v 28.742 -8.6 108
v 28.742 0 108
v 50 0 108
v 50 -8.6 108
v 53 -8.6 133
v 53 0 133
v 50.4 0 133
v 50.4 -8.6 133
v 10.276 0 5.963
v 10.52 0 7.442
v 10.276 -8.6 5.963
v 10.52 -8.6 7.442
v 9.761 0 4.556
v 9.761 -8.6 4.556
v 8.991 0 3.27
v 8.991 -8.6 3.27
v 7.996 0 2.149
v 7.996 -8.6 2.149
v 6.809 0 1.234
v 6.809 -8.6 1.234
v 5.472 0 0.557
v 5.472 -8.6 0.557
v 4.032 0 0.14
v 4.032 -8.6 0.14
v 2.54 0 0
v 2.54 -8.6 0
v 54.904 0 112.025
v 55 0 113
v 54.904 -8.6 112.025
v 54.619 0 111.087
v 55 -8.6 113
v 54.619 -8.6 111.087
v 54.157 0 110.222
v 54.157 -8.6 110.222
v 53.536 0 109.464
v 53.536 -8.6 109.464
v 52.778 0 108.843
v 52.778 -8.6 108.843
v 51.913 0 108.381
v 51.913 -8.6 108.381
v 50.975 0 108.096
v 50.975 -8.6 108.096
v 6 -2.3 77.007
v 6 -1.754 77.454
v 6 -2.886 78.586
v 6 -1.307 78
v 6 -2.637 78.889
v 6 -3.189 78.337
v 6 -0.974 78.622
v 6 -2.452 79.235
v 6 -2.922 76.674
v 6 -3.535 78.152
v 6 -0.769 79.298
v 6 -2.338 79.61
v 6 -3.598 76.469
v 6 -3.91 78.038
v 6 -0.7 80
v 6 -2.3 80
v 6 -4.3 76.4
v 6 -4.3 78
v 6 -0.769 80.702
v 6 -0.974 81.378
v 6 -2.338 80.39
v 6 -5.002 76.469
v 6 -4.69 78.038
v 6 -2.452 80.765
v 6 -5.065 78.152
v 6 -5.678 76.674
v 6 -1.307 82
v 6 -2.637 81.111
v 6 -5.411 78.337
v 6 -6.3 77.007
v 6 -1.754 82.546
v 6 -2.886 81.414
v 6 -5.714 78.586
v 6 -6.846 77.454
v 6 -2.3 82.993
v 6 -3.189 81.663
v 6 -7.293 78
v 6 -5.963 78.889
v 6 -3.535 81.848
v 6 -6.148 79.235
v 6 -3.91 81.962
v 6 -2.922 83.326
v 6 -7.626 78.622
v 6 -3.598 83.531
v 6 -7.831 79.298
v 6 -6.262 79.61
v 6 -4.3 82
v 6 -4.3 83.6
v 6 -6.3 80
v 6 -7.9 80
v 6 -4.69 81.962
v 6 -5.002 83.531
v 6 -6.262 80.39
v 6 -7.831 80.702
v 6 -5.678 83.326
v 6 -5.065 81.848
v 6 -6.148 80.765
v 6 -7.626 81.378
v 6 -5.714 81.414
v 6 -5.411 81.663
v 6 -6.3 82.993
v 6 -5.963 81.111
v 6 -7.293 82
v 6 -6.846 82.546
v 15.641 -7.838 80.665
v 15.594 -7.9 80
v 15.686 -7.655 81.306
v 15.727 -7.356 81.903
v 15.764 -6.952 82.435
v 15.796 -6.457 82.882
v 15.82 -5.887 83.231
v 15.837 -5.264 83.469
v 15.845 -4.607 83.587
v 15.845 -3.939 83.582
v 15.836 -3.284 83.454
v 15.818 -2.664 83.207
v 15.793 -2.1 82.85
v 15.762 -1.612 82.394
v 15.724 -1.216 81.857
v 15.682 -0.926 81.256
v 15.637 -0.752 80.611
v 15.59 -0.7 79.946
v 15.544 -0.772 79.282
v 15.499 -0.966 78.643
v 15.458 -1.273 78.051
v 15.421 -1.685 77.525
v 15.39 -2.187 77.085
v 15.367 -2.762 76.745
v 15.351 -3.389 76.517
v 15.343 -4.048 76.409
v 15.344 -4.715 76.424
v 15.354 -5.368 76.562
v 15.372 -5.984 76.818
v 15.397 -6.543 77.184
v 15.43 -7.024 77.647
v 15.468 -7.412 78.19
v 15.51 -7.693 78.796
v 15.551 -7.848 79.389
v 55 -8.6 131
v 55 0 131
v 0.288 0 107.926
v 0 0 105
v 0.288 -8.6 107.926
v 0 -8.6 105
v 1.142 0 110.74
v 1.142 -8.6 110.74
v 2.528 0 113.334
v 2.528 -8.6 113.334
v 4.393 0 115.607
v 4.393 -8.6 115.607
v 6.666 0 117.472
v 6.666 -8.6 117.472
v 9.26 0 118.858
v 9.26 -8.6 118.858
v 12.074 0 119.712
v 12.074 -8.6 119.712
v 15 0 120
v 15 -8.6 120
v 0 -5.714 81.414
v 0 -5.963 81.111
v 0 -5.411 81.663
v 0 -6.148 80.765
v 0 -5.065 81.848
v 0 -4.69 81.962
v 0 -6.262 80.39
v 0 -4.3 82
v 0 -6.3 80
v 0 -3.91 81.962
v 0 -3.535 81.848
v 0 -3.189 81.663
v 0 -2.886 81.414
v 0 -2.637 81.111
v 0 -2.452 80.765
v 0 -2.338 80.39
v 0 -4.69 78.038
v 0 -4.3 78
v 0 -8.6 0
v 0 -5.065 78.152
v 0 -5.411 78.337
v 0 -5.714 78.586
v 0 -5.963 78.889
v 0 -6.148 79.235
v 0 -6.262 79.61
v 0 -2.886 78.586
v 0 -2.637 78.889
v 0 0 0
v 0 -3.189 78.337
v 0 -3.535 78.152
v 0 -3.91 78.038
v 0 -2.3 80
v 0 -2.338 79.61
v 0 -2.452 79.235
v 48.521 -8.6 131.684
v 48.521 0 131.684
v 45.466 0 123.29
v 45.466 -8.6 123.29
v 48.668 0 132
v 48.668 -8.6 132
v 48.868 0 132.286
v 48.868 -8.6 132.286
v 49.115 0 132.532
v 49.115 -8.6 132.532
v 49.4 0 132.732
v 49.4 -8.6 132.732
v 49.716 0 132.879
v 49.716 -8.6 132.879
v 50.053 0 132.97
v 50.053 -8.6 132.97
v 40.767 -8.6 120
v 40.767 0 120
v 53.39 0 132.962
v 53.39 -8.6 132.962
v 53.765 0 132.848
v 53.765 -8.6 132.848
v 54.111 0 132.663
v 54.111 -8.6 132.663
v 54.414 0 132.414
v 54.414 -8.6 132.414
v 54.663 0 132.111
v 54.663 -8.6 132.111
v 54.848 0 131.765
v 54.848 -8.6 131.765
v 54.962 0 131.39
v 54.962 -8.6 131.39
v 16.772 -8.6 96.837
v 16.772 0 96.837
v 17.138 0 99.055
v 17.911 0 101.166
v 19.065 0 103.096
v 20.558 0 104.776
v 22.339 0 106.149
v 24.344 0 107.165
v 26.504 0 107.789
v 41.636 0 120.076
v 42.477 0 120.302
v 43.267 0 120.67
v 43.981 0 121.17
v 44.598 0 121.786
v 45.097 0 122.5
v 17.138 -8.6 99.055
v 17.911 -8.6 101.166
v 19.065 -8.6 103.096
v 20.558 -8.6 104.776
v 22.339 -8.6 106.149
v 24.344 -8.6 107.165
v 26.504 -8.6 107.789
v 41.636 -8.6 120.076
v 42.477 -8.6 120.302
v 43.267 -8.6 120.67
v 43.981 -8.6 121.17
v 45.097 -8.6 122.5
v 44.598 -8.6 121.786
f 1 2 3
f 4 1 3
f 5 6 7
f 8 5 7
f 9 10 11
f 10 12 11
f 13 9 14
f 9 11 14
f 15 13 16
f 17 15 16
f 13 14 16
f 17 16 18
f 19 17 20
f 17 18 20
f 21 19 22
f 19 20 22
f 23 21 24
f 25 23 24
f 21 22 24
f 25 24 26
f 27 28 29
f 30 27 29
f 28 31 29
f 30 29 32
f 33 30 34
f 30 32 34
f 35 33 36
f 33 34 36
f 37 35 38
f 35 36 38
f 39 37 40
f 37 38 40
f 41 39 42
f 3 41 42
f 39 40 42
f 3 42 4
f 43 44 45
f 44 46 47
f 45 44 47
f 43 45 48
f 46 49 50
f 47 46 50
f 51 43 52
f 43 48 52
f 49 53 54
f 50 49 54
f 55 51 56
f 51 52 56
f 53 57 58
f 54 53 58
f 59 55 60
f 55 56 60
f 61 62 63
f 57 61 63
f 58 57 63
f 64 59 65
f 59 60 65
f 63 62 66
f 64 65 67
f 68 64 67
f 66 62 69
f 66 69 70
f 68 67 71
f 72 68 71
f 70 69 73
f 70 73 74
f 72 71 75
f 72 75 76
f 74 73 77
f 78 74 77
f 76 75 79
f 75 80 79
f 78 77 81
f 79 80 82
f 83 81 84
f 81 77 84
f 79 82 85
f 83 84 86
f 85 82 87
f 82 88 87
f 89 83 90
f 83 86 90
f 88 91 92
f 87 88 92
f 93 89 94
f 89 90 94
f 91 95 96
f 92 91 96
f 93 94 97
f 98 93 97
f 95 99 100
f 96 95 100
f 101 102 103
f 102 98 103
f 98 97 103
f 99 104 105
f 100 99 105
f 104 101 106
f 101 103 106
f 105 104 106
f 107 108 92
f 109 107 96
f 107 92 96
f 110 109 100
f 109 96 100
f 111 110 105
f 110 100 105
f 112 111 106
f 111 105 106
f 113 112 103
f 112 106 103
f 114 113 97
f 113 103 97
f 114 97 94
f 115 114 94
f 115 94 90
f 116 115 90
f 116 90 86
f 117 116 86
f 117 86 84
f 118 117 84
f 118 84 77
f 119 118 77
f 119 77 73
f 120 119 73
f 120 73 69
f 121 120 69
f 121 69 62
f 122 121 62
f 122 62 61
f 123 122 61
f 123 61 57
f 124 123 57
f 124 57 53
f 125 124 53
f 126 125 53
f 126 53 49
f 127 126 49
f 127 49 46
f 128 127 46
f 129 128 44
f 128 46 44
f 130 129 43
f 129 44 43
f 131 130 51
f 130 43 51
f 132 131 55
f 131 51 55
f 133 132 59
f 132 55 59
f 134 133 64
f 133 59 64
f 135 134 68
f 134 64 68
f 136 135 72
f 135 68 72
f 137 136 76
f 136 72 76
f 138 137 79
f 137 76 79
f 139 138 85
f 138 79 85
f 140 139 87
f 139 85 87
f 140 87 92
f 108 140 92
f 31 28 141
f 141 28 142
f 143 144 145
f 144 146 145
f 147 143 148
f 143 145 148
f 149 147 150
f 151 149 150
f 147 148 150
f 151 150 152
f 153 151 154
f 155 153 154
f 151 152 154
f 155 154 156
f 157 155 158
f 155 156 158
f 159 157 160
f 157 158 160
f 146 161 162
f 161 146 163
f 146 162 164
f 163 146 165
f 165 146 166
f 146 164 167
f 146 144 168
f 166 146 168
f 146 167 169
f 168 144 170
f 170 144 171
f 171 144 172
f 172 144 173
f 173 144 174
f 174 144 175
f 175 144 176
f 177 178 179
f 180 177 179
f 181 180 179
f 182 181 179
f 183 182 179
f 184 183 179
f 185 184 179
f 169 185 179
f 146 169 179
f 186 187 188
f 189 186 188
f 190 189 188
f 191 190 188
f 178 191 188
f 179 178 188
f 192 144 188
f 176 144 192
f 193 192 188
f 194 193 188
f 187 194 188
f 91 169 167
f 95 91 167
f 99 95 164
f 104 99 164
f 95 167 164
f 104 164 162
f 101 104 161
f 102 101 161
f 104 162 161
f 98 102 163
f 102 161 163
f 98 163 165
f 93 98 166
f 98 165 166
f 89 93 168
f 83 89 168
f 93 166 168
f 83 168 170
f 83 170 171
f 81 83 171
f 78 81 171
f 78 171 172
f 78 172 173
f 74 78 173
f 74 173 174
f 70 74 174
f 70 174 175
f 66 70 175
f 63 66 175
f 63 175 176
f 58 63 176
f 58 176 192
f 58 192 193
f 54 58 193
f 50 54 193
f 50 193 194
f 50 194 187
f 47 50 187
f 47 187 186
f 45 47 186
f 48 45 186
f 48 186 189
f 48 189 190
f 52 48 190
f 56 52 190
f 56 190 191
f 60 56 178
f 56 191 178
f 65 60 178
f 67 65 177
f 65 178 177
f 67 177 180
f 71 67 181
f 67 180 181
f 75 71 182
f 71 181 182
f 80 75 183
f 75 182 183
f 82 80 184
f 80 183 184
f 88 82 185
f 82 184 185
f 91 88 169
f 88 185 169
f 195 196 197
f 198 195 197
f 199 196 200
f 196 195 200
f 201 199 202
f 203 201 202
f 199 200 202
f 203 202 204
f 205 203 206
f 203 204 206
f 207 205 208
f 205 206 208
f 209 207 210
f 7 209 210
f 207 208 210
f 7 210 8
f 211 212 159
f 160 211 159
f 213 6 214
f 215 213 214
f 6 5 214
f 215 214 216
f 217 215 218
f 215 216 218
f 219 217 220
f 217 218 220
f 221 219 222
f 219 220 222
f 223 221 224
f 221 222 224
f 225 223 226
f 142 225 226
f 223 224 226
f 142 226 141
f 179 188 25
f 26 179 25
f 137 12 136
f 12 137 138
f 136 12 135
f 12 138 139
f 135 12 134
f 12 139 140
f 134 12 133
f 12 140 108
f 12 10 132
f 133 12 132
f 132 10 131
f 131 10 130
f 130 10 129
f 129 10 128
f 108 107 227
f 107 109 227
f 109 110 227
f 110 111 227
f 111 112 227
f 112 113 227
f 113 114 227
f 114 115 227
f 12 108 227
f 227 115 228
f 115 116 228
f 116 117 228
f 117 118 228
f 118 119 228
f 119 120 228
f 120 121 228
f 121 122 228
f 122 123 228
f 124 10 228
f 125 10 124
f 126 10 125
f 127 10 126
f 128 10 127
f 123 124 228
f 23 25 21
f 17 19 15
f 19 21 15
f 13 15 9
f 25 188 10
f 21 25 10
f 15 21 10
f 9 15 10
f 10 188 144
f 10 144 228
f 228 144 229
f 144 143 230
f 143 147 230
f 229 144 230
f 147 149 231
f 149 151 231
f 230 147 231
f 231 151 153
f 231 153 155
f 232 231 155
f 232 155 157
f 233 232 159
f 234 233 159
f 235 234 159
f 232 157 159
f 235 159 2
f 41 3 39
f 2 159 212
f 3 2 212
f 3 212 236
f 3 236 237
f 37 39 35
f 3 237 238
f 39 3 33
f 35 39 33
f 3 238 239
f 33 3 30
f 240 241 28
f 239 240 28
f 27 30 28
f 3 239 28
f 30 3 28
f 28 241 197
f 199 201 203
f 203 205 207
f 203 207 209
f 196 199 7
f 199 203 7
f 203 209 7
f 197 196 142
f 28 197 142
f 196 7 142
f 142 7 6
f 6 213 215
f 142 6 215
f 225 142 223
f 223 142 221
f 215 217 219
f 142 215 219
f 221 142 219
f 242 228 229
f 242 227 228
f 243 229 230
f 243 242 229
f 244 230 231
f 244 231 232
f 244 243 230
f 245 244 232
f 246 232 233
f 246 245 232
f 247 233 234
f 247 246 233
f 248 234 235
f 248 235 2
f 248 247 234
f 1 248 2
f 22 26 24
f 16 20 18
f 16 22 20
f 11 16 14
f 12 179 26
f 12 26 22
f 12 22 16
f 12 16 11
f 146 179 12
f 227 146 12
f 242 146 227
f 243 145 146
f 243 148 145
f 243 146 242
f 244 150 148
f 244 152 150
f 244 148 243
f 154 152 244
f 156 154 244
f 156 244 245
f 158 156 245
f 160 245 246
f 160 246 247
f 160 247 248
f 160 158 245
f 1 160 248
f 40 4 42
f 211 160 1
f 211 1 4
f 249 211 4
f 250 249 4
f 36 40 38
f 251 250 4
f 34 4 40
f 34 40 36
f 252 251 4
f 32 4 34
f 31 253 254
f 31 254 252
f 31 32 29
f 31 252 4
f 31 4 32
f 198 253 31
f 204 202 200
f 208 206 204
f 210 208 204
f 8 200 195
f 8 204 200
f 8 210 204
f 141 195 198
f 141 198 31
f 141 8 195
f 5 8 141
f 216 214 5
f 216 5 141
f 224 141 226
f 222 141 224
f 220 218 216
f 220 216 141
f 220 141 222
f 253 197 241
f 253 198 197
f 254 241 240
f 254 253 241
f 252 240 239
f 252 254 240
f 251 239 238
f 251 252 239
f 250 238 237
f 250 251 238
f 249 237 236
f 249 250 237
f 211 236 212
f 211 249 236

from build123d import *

# Parameters (mm, degrees)
F1_DEPTH  = 8.6
F2_R      = 12
F3_R      = 8
F4_R      = 15
F5_R      = 5
F6_R      = 5
F7_R      = 2
F8_R      = 2
F9_DEPTH  = 25
F11_START = -6
F10_R     = 3.6
F11_DEPTH = 19


with BuildPart() as f1:
    # F0 (on Front) → F1 (new body)
    with BuildSketch(Plane.XZ):
        Polygon((0, 120), (0, 0), (10, 0), (17.5520956899, 108), (55, 108), (55, 133), (49, 133), (44.2683869545, 120), align=None)
    extrude(amount=F1_DEPTH)

    # F2
    f2_edges = [f1.edges().sort_by_distance(p)[0] for p in [
        (17.552096, -4.3, 108),
    ]]
    fillet(f2_edges, radius=F2_R)

    # F3
    f3_edges = [f1.edges().sort_by_distance(p)[0] for p in [
        (10, -4.3, 0),
    ]]
    fillet(f3_edges, radius=F3_R)

    # F4
    f4_edges = [f1.edges().sort_by_distance(p)[0] for p in [
        (0, -4.3, 120),
    ]]
    fillet(f4_edges, radius=F4_R)

    # F5
    f5_edges = [f1.edges().sort_by_distance(p)[0] for p in [
        (55, -4.3, 108),
    ]]
    fillet(f5_edges, radius=F5_R)

    # F6
    f6_edges = [f1.edges().sort_by_distance(p)[0] for p in [
        (44.268387, -4.3, 120),
    ]]
    fillet(f6_edges, radius=F6_R)

    # F7
    f7_edges = [f1.edges().sort_by_distance(p)[0] for p in [
        (49, -4.3, 133),
        (55, -4.3, 133),
    ]]
    fillet(f7_edges, radius=F7_R)

    # F8 (on face) → F9 (cut)
    with BuildSketch(Plane(origin=(0, 0, 0), x_dir=(0, -1, 0), z_dir=(-1, 0, 0))):
        with Locations((4.3, 80)):
            Circle(F8_R)
    extrude(amount=-F9_DEPTH, mode=Mode.SUBTRACT)

    # F10 (on face) → F11 (cut)
    with BuildSketch(Plane(origin=(0, 0, 0), x_dir=(0, -1, 0), z_dir=(-1, 0, 0)).offset(F11_START)):
        with Locations((4.3, 80)):
            Circle(F10_R)
    extrude(amount=-F11_DEPTH, mode=Mode.SUBTRACT)


solid = f1.part
